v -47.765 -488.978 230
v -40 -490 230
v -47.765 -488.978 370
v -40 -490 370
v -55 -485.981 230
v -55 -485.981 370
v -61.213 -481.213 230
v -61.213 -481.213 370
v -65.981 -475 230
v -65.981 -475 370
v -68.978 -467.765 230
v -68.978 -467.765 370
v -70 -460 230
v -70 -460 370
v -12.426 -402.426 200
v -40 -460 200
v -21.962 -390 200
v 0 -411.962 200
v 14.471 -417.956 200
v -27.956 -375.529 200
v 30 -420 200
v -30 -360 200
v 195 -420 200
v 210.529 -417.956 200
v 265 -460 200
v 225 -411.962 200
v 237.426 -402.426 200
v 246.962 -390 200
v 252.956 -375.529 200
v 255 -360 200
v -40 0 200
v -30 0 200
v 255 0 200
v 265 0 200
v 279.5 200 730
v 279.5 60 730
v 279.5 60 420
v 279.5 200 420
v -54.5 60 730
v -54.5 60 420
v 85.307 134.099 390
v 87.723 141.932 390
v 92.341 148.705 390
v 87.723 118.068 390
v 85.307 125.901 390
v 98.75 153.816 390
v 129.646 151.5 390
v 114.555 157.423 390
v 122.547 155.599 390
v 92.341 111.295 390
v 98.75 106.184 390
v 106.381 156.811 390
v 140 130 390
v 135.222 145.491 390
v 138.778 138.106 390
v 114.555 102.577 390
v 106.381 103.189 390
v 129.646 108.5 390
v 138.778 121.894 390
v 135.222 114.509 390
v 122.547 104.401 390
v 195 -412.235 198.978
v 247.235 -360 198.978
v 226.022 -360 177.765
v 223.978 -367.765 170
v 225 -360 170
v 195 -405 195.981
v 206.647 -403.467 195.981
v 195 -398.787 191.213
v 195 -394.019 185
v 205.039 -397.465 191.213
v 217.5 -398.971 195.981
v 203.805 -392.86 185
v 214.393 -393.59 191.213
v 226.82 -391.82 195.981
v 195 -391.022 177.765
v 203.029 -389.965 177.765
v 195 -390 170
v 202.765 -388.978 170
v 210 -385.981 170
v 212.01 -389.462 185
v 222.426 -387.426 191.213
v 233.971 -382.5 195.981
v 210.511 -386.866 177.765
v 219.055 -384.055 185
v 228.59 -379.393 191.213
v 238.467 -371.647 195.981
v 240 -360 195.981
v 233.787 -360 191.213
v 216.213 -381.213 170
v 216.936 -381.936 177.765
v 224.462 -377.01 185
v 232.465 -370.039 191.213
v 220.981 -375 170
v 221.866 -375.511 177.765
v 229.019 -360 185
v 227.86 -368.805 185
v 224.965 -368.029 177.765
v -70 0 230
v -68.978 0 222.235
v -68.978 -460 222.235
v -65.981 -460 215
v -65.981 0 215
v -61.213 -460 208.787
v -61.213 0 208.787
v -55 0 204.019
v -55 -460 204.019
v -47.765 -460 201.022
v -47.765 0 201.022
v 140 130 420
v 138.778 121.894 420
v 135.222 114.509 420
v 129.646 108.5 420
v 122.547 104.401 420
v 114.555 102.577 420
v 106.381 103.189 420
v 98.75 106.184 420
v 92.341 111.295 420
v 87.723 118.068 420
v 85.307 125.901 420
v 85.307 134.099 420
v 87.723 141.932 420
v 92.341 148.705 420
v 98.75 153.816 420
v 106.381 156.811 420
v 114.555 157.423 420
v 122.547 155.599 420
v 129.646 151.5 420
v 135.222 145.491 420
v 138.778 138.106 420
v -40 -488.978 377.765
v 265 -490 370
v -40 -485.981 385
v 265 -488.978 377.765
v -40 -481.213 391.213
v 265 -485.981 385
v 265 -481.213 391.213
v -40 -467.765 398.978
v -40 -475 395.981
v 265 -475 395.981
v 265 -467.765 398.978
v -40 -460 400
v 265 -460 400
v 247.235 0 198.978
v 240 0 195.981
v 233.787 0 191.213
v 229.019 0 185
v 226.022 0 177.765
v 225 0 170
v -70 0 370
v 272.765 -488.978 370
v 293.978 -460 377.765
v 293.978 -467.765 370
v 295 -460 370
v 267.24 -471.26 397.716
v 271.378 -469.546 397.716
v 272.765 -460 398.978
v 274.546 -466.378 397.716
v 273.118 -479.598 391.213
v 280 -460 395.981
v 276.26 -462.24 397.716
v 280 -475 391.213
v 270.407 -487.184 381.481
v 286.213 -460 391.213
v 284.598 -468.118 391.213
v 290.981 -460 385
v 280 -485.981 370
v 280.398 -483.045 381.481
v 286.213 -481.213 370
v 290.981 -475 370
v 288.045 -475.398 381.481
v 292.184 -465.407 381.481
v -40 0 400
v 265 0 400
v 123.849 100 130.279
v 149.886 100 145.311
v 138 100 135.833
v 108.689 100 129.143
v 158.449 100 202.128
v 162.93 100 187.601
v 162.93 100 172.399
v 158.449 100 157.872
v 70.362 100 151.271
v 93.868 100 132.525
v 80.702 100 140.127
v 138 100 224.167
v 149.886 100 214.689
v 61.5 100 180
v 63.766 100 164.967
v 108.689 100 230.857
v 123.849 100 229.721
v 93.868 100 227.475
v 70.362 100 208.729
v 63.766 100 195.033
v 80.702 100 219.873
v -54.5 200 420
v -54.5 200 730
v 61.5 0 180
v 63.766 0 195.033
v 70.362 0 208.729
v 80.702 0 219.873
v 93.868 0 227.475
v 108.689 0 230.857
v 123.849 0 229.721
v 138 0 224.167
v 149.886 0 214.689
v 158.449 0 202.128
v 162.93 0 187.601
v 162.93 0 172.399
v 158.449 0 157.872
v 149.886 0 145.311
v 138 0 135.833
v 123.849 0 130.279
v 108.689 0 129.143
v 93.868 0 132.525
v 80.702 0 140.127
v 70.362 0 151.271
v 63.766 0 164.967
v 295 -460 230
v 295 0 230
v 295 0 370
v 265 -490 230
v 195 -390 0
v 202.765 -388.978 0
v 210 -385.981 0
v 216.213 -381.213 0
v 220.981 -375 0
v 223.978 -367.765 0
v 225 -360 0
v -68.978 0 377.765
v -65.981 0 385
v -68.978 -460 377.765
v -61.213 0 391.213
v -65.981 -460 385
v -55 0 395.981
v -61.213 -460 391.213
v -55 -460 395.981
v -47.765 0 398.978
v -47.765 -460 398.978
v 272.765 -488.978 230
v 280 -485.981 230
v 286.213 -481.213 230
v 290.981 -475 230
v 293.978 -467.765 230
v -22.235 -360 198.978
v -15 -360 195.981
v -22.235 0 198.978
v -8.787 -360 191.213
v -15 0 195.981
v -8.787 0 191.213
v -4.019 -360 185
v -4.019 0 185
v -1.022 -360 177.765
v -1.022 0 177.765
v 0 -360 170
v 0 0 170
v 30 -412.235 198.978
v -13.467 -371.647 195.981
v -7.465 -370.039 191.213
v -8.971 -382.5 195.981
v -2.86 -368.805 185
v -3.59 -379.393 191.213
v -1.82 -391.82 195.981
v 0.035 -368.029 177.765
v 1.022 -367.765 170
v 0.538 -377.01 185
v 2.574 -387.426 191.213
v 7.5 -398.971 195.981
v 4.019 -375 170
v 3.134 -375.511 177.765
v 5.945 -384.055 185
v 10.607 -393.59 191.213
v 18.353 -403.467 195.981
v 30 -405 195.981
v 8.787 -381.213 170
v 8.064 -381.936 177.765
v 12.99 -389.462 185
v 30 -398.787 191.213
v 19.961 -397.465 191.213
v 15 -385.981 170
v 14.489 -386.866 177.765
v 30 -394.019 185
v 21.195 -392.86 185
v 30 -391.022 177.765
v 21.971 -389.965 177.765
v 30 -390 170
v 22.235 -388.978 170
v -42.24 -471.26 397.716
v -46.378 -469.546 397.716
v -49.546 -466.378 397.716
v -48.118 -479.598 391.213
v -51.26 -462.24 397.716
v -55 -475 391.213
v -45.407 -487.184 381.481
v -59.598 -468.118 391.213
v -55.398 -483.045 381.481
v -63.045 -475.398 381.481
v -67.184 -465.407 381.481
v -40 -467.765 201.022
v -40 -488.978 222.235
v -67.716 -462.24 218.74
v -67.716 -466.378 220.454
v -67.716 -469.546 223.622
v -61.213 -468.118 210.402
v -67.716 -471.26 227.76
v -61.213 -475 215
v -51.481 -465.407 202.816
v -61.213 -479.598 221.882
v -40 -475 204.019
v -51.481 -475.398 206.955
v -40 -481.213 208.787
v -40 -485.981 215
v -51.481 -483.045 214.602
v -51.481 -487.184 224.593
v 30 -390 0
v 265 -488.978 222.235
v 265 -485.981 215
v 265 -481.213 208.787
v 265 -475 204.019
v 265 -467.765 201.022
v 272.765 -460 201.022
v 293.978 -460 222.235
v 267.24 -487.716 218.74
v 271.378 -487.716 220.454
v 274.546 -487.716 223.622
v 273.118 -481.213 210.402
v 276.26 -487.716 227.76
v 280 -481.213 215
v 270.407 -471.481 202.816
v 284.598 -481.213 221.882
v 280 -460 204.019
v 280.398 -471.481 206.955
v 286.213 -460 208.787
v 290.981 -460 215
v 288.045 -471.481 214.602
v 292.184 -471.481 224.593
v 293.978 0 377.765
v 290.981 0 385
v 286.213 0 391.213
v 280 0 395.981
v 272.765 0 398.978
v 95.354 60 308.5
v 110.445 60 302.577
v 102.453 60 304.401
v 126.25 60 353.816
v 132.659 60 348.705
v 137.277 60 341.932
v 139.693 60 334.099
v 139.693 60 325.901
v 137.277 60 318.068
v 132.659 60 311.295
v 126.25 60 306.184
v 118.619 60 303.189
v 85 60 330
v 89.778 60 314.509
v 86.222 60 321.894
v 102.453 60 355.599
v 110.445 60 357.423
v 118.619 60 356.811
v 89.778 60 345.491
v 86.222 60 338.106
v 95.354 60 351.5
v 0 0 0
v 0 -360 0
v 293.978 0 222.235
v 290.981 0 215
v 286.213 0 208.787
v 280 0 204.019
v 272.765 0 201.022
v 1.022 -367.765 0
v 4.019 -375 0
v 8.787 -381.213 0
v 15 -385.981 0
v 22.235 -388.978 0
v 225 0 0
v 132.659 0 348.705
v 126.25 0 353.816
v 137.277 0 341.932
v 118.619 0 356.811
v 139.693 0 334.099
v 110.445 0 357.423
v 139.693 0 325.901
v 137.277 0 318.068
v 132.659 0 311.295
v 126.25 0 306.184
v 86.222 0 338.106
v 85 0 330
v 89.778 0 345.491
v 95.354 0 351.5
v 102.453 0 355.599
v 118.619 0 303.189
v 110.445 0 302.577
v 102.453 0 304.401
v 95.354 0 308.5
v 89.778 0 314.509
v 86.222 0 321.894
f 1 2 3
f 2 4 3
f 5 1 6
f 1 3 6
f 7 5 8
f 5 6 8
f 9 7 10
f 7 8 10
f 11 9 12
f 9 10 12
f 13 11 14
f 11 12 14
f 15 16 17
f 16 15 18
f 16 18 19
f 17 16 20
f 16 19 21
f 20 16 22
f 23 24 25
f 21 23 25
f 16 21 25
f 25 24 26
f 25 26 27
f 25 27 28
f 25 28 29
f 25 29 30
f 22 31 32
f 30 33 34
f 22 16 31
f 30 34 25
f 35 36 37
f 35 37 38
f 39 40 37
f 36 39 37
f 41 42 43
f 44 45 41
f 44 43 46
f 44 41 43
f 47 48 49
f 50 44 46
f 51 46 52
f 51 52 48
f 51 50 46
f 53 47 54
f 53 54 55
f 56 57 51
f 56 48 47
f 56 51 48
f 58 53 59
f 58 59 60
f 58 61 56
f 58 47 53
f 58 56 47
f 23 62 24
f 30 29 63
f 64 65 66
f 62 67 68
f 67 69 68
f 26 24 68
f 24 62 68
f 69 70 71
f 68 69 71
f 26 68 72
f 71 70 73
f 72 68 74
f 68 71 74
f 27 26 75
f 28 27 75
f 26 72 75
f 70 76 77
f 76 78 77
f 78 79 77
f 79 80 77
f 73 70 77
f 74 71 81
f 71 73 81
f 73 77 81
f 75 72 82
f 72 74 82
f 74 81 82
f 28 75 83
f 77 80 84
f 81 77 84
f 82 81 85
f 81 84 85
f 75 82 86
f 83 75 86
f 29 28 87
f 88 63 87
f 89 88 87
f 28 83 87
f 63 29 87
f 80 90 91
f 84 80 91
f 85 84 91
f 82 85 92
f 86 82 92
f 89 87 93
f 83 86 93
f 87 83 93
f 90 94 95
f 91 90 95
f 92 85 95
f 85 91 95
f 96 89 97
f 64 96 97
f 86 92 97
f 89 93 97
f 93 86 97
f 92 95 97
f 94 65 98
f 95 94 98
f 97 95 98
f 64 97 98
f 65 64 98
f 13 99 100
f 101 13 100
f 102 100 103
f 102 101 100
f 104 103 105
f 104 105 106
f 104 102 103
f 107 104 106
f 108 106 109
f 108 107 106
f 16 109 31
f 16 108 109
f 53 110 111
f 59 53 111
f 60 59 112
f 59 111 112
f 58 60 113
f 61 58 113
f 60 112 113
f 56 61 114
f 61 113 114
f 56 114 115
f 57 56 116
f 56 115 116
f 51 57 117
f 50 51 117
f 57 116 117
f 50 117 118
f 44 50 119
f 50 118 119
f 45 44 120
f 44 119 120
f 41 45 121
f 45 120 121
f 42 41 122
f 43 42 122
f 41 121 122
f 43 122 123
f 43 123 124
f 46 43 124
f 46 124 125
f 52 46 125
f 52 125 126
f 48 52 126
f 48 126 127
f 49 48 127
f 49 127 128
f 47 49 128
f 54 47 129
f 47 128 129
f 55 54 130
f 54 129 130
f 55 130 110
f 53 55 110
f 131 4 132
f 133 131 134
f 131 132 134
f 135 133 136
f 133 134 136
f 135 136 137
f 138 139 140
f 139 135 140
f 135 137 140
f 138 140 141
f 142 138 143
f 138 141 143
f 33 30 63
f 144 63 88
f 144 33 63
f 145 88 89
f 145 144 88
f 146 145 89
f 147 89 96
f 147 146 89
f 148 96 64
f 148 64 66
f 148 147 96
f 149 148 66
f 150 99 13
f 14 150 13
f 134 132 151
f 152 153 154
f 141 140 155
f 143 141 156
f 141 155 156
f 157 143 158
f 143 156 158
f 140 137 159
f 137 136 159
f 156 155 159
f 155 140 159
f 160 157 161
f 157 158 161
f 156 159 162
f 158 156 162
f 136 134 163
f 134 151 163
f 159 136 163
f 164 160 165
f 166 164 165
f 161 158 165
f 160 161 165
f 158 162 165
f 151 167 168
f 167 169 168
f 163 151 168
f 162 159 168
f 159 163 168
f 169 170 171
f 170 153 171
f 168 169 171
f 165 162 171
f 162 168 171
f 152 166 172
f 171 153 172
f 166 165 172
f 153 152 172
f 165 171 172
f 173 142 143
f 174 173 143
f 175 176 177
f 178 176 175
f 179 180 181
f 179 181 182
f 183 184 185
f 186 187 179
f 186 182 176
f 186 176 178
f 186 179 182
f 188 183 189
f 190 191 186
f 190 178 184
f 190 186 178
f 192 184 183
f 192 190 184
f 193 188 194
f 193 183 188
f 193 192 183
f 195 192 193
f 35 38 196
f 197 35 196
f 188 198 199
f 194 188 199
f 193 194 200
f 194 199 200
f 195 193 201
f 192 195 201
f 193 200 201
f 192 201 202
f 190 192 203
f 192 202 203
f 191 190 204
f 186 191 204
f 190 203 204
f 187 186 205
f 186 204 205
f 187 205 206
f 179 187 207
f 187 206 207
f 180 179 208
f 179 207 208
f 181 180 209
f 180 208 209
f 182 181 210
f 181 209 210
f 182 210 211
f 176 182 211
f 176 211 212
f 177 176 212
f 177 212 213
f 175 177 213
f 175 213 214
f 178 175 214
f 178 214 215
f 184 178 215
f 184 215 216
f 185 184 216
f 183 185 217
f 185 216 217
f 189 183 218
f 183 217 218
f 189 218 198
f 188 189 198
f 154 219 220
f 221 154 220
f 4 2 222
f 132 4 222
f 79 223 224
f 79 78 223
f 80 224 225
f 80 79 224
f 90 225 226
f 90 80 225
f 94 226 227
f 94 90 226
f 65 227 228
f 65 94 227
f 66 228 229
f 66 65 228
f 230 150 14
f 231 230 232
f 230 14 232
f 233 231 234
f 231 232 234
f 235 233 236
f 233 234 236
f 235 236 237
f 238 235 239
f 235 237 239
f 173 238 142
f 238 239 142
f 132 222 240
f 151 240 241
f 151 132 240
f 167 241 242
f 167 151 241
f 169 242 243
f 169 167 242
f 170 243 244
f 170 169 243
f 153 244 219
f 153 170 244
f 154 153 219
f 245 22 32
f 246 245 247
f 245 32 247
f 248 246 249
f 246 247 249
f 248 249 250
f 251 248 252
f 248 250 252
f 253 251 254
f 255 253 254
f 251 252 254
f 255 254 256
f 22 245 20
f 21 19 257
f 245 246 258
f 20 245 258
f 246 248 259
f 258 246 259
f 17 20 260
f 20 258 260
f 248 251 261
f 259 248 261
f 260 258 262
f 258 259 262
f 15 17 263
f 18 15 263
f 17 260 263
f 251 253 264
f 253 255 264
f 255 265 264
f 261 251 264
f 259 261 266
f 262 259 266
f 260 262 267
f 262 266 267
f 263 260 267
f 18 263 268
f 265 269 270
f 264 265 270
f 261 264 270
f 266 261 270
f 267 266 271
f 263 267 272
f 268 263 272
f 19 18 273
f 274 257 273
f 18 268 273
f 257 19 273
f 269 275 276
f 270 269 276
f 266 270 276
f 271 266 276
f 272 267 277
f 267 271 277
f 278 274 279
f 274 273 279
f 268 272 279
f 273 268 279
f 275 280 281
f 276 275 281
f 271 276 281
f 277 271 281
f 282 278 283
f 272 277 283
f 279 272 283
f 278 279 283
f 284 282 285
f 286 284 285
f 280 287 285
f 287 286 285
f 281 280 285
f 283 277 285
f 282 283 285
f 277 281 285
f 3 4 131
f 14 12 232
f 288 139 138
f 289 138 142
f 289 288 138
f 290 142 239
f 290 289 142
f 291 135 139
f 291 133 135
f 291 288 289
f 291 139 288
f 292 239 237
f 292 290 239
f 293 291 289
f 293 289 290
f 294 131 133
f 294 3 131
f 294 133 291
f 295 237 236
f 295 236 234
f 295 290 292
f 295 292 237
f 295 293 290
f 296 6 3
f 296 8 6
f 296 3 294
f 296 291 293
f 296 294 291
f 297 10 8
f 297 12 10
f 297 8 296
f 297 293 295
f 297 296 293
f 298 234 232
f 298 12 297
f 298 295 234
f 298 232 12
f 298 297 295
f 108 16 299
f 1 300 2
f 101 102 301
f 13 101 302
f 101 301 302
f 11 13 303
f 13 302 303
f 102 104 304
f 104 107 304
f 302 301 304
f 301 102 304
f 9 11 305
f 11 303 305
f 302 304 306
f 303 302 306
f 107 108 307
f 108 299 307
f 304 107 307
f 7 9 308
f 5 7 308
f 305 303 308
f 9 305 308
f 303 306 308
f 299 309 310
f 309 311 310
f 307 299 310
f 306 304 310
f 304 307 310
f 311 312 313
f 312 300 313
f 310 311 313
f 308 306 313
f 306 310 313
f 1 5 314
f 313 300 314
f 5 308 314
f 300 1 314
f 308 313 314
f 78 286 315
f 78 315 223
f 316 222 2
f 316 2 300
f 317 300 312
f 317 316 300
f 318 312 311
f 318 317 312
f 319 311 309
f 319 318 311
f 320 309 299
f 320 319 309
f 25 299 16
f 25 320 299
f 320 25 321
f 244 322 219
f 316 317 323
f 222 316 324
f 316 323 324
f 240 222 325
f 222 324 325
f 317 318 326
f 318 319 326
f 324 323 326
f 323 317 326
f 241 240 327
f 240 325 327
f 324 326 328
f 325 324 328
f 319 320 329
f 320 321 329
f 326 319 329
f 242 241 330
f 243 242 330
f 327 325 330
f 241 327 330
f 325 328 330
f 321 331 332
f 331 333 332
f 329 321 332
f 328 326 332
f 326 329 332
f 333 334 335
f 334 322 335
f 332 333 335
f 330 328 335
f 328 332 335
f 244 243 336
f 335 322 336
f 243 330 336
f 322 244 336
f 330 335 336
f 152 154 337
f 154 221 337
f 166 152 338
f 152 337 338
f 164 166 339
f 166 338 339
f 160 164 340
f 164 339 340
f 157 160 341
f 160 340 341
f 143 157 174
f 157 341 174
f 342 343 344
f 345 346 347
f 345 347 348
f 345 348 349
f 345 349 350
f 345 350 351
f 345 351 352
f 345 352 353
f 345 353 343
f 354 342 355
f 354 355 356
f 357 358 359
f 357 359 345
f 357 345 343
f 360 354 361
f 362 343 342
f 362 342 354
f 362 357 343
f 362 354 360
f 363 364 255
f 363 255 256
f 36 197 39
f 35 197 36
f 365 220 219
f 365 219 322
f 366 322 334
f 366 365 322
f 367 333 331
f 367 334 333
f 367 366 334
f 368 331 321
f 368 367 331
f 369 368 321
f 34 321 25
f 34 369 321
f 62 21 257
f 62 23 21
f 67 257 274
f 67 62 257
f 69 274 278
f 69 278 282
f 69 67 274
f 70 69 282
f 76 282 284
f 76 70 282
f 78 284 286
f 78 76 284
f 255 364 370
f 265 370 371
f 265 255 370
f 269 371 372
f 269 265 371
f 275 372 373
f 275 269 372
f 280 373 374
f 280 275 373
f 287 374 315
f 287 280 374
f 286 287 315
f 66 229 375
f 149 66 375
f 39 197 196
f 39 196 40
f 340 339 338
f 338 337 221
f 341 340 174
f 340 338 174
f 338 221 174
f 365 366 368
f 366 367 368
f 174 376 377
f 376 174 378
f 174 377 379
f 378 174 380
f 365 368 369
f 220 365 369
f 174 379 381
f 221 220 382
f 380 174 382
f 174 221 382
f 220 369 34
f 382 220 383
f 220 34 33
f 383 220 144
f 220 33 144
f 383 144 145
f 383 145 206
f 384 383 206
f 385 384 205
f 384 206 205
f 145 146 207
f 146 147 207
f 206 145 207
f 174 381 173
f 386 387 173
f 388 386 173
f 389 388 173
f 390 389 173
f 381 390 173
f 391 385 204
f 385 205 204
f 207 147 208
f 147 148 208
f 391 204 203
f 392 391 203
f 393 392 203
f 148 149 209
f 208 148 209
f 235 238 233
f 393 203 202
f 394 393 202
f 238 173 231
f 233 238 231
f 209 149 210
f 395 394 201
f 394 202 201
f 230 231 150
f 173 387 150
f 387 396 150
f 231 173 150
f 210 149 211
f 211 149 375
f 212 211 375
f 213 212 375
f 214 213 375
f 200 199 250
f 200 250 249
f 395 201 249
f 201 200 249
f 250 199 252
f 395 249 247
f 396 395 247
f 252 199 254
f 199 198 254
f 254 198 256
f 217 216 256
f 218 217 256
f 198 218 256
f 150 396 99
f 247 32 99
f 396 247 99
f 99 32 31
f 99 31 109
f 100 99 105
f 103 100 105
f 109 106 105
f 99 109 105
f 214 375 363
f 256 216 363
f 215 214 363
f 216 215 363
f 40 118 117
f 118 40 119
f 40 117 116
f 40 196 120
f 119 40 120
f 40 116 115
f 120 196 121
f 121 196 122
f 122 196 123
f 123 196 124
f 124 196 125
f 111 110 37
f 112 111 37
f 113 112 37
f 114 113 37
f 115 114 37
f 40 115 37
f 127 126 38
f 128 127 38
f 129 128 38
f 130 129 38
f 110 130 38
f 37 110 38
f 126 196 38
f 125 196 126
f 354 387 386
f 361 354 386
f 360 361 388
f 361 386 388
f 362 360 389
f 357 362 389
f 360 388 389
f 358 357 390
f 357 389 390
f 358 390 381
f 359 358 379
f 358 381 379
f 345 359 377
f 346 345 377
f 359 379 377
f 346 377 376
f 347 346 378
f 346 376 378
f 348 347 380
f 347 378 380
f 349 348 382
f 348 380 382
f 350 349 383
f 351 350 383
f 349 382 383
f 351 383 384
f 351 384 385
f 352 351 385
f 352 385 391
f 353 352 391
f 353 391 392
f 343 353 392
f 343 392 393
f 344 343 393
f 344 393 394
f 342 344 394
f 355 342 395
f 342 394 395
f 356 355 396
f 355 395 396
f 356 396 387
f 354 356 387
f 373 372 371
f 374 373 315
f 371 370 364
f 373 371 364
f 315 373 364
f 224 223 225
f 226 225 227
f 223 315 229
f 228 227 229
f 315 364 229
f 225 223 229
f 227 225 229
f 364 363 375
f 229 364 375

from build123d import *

# Parameters (mm, degrees)
F0_W      = 225
F0_H      = 390
F1_DEPTH  = 200
F2_W      = 182.5
F2_H      = 295
F2_H_2    = 195
F3_DEPTH  = 200
F4_R      = 30
F5_R      = 51
F6_DEPTH  = 100
F5_R_2    = 27.5
F7_DEPTH  = 60
F10_DEPTH = 310
F11_R     = 27.5
F12_DEPTH = 30


with BuildPart() as f1:
    # F0 (on Top) → F1 (new body)
    with BuildSketch(Plane.XY):
        with Locations((112.5, -195)):
            Rectangle(F0_W, F0_H)
    extrude(amount=F1_DEPTH)

    # F2 (on face) → F3 (join)
    with BuildSketch(Plane.XY.offset(200)):
        with Locations((21.25, -342.5)):
            Rectangle(F2_W, F2_H)
        with Locations((21.25, -97.5)):
            Rectangle(F2_W, F2_H_2)
        Polygon((112.5, 0), (112.5, -195), (112.5, -490), (295, -490), (295, 0), align=None)
    extrude(amount=F3_DEPTH)

    # F4
    f4_edges = [f1.edges().sort_by_distance(p)[0] for p in [
        (225, -390, 100),
        (112.5, -390, 200),
        (0, -390, 100),
        (295, -245, 200),
        (112.5, -490, 200),
        (-70, -245, 200),
        (-70, -490, 300),
        (295, -490, 300),
        (112.5, -490, 400),
        (-70, -245, 400),
        (295, -245, 400),
        (0, -195, 200),
        (225, -195, 200),
    ]]
    fillet(f4_edges, radius=F4_R)

    # F5 (on face) → F6 (join)
    with BuildSketch(Plane(origin=(0, 0, 0), x_dir=(-1, 0, 0), z_dir=(0, 1, 0))):
        with Locations((-112.5, 180)):
            Circle(F5_R)
    extrude(amount=F6_DEPTH)

    # F5 (on face) → F7 (join)
    with BuildSketch(Plane(origin=(0, 0, 0), x_dir=(-1, 0, 0), z_dir=(0, 1, 0))):
        with Locations((-112.5, 330)):
            Circle(F5_R_2)
    extrude(amount=F7_DEPTH)


with BuildPart() as f10:
    # F9 (on offset) → F10 (new body)
    with BuildSketch(Plane.XY.offset(420)):
        Polygon((-54.5, 60), (112.5, 60), (279.5, 60), (279.5, 200), (-54.5, 200), align=None)
    extrude(amount=F10_DEPTH)

    # F11 (on face) → F12 (join)
    with BuildSketch(Plane(origin=(0, 0, 420), x_dir=(1, 0, 0), z_dir=(0, 0, -1))):
        with Locations((112.5, -130)):
            Circle(F11_R)
    extrude(amount=F12_DEPTH)


solid = Compound([f1.part, f10.part])
